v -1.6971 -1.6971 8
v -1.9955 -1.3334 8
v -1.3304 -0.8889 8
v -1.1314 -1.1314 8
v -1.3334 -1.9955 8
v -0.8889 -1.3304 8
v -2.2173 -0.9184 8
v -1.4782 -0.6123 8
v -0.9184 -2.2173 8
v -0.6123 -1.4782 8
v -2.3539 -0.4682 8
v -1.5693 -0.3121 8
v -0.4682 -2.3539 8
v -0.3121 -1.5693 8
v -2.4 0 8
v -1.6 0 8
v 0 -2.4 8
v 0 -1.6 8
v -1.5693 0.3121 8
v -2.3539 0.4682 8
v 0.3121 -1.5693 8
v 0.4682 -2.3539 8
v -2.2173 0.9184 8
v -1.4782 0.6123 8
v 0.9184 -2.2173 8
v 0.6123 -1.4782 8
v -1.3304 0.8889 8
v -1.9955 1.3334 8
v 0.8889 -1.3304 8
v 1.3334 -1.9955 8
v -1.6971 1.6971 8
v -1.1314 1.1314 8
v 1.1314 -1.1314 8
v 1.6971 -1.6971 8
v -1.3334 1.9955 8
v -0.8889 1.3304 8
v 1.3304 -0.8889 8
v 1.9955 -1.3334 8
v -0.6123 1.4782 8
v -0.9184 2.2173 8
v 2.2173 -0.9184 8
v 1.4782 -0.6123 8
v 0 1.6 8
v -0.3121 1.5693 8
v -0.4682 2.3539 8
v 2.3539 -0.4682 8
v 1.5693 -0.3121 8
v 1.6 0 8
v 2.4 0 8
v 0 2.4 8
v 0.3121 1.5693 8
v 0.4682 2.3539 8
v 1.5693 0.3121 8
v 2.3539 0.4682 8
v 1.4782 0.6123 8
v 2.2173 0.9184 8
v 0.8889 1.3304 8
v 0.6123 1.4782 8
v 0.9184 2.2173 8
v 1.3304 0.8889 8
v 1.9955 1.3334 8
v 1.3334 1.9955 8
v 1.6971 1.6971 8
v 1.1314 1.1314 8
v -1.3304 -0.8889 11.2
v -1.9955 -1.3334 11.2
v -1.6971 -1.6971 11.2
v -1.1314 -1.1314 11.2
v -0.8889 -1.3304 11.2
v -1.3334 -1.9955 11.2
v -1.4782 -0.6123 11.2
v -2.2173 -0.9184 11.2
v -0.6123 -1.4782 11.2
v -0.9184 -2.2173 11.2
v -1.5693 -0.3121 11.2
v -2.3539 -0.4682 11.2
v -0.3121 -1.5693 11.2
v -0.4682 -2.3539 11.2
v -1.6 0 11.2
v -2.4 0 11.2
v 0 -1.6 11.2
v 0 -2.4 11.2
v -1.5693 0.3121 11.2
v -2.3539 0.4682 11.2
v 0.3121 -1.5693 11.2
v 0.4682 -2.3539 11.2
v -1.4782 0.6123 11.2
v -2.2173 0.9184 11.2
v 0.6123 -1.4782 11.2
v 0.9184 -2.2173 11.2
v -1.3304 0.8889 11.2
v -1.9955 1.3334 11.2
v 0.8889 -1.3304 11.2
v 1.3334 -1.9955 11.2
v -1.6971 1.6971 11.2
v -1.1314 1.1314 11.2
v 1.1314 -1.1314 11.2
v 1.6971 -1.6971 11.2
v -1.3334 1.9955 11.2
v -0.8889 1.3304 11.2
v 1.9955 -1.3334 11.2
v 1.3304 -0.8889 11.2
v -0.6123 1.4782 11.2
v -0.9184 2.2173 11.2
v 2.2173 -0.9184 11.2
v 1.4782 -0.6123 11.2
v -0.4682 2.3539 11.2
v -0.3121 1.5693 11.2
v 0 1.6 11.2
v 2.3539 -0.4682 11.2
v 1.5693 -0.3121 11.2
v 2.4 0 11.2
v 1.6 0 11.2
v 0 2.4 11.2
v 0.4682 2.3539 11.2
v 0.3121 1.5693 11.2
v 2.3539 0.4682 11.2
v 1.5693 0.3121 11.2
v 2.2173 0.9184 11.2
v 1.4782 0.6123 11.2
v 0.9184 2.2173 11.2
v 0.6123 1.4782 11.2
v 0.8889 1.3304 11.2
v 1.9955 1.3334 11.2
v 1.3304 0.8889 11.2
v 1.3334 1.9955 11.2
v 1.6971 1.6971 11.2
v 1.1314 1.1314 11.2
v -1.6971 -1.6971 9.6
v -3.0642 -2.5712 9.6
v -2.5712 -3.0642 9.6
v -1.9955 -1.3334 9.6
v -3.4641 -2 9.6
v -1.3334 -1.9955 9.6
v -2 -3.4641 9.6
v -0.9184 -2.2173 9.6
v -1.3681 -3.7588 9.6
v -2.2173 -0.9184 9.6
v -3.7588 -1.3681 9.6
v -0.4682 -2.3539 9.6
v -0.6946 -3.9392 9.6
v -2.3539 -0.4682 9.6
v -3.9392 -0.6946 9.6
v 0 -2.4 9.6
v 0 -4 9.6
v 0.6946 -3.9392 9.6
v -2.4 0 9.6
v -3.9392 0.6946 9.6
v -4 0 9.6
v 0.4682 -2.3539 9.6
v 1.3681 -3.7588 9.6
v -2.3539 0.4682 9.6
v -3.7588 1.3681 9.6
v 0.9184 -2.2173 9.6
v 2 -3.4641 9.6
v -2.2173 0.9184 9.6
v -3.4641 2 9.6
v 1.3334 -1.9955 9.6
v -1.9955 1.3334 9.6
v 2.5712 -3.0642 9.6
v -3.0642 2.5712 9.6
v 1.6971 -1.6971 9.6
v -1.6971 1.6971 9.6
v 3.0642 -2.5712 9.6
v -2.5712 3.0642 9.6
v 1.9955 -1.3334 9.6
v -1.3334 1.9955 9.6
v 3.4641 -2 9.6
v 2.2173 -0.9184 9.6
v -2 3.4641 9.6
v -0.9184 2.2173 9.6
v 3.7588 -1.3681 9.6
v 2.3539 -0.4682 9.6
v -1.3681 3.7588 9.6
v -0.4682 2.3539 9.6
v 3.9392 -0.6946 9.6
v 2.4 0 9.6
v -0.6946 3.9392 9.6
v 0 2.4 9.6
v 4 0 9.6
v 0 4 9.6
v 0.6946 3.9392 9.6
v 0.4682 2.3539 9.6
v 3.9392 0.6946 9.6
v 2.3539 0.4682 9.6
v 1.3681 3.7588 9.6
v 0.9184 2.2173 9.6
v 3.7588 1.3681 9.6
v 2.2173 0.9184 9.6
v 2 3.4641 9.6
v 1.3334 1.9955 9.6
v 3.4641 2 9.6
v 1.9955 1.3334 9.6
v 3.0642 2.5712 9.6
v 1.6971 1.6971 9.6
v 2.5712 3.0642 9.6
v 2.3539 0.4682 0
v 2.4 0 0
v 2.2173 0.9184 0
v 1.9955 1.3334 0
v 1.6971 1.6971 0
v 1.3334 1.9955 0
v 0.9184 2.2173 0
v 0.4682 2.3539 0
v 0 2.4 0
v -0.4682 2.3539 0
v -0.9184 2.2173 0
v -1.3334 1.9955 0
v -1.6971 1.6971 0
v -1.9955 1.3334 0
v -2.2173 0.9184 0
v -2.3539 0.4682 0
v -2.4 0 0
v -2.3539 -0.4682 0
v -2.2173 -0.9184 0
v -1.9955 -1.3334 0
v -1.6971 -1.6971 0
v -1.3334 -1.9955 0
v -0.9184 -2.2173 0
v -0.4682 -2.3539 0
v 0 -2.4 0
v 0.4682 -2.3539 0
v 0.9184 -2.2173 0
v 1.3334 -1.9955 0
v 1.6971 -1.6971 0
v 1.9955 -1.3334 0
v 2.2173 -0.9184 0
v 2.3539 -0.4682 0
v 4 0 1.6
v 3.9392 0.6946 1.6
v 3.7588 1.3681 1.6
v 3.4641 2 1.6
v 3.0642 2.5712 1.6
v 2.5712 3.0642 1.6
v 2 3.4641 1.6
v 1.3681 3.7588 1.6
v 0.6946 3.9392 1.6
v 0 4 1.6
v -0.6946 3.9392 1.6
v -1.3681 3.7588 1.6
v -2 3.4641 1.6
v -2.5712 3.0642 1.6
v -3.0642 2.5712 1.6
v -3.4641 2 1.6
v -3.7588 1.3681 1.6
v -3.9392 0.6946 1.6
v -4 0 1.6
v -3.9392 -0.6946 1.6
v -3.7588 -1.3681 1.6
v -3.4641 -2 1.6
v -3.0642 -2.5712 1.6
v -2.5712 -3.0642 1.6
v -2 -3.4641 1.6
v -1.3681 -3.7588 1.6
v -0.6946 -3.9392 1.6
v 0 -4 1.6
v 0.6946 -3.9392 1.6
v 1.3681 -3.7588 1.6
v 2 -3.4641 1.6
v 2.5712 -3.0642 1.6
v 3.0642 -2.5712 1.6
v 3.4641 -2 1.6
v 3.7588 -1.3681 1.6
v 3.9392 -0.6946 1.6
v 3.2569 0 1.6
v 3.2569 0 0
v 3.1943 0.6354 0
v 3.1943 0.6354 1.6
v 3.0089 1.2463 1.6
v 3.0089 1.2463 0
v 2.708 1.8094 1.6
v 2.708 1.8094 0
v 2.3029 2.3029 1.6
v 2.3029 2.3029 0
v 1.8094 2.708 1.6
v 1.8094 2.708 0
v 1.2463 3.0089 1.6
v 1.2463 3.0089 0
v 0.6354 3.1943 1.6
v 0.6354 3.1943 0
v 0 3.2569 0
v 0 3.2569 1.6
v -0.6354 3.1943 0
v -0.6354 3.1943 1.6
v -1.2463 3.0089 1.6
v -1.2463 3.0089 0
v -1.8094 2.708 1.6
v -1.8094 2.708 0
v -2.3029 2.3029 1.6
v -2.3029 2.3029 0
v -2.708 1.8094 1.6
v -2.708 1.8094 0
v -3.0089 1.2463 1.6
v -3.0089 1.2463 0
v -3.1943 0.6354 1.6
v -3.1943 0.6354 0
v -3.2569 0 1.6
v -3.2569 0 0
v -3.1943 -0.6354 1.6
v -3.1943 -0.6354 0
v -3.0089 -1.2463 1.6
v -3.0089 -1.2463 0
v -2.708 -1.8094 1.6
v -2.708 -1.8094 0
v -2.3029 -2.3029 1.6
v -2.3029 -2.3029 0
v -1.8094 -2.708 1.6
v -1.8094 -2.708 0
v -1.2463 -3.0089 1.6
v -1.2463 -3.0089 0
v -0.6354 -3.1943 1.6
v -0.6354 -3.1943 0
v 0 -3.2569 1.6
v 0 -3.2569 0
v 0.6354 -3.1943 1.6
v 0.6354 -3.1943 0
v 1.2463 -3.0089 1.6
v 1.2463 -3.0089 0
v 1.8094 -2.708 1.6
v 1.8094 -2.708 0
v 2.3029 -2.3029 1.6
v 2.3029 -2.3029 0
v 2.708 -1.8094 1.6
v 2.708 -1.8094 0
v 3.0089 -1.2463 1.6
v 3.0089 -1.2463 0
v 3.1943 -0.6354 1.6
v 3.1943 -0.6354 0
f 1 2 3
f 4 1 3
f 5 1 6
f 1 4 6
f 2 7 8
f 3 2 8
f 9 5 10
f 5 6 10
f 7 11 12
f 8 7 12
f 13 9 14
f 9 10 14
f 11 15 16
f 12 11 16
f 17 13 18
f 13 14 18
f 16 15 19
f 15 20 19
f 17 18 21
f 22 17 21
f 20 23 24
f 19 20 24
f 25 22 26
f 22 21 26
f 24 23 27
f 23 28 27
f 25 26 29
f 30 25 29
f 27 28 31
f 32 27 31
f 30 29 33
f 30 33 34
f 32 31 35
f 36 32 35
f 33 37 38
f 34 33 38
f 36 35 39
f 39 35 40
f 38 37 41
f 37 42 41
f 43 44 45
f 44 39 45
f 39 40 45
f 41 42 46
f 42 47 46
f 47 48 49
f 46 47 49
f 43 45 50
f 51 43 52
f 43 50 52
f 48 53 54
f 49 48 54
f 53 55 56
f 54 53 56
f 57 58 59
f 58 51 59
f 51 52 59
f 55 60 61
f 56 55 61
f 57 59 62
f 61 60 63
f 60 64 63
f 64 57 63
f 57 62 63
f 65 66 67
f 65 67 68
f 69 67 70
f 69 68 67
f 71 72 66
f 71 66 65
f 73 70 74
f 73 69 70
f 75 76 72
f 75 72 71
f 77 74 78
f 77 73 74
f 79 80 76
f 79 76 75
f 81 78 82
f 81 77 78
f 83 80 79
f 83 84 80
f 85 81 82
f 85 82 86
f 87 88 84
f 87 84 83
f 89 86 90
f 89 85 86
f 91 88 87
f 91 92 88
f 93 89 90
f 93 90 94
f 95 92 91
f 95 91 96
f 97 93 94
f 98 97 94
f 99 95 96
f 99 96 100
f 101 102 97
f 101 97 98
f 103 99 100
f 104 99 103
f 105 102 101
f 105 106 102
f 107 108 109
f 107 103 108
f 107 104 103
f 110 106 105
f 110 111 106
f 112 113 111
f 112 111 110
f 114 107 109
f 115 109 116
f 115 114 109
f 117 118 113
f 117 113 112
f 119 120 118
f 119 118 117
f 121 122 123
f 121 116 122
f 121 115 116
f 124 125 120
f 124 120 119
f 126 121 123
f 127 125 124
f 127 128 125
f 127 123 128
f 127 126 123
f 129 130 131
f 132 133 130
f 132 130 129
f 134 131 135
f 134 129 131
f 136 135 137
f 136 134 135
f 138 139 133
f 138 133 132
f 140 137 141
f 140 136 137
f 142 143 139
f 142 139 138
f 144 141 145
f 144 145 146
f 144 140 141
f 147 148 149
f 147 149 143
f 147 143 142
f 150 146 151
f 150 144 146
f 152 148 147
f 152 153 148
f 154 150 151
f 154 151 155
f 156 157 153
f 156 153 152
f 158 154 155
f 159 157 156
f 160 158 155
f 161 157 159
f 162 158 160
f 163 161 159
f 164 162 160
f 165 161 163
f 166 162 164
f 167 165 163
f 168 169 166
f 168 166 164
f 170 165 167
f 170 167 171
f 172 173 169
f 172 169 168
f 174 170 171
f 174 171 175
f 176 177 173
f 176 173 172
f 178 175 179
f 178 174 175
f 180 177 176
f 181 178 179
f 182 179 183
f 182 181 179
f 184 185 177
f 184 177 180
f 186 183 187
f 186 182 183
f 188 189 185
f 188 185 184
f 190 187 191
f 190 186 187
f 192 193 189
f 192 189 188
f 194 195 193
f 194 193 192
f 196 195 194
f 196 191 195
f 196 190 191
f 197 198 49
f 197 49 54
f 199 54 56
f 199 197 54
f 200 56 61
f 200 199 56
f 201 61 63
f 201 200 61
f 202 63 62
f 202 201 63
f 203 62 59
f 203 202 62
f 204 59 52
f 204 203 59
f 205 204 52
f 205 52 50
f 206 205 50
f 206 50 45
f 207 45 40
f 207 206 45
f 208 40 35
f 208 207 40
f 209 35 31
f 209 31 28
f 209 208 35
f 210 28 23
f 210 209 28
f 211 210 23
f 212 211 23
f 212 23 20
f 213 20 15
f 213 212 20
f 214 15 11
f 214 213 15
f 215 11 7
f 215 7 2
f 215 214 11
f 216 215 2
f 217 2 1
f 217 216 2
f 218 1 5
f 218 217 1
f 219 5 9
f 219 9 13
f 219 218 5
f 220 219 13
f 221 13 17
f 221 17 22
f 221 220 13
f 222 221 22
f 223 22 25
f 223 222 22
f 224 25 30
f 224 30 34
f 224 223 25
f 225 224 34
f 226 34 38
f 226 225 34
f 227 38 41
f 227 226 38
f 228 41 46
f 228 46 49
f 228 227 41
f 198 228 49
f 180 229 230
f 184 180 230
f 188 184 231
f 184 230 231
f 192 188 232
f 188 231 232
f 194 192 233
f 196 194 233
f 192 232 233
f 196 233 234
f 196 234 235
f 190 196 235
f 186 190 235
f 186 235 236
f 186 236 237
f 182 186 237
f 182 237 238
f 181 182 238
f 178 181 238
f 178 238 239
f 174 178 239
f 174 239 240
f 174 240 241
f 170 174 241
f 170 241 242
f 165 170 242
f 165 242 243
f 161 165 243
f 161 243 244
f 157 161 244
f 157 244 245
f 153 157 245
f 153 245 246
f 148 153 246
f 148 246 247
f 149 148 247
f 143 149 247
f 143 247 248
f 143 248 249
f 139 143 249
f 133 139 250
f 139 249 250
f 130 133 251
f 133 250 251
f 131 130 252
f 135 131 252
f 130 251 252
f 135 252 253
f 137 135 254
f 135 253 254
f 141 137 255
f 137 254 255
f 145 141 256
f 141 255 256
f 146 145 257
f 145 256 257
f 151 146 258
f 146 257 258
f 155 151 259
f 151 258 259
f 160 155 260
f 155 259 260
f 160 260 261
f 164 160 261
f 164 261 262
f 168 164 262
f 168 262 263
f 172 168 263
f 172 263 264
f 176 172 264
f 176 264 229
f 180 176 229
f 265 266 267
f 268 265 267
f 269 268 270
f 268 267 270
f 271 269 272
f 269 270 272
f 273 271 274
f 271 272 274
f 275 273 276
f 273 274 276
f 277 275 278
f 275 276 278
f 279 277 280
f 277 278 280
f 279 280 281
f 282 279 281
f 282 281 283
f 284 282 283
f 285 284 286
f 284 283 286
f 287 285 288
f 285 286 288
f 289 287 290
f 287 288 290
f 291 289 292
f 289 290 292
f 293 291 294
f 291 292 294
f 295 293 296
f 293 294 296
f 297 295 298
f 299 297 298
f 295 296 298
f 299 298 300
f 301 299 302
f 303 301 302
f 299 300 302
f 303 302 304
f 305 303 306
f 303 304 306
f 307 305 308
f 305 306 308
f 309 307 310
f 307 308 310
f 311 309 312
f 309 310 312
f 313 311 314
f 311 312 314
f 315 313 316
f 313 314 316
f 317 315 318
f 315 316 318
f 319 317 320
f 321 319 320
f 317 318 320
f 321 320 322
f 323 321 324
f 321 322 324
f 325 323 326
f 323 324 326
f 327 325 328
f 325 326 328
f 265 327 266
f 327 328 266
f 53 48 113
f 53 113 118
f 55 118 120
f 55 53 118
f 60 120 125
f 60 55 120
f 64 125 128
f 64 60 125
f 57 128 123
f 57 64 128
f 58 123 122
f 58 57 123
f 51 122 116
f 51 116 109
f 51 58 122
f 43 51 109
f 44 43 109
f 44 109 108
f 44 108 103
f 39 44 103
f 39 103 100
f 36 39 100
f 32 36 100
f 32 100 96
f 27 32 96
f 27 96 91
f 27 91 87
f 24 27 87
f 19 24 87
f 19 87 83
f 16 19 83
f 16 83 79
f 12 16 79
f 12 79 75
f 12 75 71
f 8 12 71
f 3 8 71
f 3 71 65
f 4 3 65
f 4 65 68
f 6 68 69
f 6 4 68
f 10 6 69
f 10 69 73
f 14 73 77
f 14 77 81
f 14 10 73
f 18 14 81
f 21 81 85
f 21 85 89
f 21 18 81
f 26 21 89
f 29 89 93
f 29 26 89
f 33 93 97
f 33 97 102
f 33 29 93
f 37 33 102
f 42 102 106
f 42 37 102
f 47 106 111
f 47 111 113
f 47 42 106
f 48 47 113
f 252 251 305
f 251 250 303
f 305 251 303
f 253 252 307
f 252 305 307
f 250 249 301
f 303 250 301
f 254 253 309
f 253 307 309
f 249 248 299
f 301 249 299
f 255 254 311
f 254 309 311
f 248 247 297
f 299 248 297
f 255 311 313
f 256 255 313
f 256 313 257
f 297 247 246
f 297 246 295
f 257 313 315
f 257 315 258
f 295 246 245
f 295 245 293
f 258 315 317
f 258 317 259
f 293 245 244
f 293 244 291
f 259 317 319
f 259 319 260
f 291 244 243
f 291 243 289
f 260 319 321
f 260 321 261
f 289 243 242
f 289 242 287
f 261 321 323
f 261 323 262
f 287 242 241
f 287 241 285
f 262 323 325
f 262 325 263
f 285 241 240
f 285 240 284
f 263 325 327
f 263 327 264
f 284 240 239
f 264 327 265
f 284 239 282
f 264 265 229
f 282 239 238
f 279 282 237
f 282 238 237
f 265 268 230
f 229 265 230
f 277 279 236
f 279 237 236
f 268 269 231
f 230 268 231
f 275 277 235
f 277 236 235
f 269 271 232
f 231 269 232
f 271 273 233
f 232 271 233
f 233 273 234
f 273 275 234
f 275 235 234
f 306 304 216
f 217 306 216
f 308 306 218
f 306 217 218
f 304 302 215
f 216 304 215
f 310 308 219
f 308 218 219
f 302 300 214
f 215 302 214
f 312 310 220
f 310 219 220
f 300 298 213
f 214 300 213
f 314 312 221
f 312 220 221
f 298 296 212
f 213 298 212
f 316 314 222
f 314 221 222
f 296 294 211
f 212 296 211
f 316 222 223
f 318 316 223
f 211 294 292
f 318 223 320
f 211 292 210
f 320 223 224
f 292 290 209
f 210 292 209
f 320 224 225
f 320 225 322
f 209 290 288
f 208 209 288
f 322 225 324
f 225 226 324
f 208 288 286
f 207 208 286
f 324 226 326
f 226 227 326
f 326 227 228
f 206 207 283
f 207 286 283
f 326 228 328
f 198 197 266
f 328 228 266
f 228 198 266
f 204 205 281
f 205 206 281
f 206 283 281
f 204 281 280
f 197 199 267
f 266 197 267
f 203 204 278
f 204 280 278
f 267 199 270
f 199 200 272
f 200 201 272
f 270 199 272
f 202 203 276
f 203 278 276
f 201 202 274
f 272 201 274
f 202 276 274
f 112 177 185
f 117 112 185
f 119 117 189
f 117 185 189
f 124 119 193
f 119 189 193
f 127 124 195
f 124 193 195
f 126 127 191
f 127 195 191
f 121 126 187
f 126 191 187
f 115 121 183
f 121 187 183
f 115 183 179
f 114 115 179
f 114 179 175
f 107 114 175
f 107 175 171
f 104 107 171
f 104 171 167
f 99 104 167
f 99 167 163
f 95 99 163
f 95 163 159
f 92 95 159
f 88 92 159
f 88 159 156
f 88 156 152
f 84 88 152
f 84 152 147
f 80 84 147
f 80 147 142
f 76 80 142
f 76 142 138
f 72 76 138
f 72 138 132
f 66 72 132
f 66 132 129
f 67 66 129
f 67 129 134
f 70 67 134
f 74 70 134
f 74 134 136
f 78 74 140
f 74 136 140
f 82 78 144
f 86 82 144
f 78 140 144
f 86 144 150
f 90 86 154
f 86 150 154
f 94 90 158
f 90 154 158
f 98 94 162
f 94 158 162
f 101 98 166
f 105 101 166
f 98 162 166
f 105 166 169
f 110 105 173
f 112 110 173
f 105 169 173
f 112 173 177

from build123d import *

# Parameters (mm, degrees)
F0_R     = 4
F0_R_2   = 2.4
F0_R_3   = 1.6
F1_DEPTH = 9.6
F2_DEPTH = 11.2
F3_DEPTH = 8
F4_R     = 4
F4_R_2   = 3.2568542495
F5_DEPTH = 1.5999999596


with BuildPart() as f1:
    # F0 (on Top) → F1 (new body)
    with BuildSketch(Plane.XY):
        Circle(F0_R)
        Circle(F0_R_2, mode=Mode.SUBTRACT)
        Circle(F0_R_2)
        Circle(F0_R_3, mode=Mode.SUBTRACT)
    extrude(amount=F1_DEPTH)

    # F0 (on Top) → F2 (join)
    with BuildSketch(Plane.XY):
        Circle(F0_R_2)
        Circle(F0_R_3, mode=Mode.SUBTRACT)
    extrude(amount=F2_DEPTH)

    # F0 (on Top) → F3 (cut, through all)
    with BuildSketch(Plane.XY):
        Circle(F0_R_2)
        Circle(F0_R_3, mode=Mode.SUBTRACT)
    extrude(amount=F3_DEPTH, mode=Mode.SUBTRACT)

    # F4 (on Top) → F5 (cut)
    with BuildSketch(Plane.XY):
        Circle(F4_R)
        Circle(F4_R_2, mode=Mode.SUBTRACT)
    extrude(amount=F5_DEPTH, mode=Mode.SUBTRACT)


solid = f1.part
